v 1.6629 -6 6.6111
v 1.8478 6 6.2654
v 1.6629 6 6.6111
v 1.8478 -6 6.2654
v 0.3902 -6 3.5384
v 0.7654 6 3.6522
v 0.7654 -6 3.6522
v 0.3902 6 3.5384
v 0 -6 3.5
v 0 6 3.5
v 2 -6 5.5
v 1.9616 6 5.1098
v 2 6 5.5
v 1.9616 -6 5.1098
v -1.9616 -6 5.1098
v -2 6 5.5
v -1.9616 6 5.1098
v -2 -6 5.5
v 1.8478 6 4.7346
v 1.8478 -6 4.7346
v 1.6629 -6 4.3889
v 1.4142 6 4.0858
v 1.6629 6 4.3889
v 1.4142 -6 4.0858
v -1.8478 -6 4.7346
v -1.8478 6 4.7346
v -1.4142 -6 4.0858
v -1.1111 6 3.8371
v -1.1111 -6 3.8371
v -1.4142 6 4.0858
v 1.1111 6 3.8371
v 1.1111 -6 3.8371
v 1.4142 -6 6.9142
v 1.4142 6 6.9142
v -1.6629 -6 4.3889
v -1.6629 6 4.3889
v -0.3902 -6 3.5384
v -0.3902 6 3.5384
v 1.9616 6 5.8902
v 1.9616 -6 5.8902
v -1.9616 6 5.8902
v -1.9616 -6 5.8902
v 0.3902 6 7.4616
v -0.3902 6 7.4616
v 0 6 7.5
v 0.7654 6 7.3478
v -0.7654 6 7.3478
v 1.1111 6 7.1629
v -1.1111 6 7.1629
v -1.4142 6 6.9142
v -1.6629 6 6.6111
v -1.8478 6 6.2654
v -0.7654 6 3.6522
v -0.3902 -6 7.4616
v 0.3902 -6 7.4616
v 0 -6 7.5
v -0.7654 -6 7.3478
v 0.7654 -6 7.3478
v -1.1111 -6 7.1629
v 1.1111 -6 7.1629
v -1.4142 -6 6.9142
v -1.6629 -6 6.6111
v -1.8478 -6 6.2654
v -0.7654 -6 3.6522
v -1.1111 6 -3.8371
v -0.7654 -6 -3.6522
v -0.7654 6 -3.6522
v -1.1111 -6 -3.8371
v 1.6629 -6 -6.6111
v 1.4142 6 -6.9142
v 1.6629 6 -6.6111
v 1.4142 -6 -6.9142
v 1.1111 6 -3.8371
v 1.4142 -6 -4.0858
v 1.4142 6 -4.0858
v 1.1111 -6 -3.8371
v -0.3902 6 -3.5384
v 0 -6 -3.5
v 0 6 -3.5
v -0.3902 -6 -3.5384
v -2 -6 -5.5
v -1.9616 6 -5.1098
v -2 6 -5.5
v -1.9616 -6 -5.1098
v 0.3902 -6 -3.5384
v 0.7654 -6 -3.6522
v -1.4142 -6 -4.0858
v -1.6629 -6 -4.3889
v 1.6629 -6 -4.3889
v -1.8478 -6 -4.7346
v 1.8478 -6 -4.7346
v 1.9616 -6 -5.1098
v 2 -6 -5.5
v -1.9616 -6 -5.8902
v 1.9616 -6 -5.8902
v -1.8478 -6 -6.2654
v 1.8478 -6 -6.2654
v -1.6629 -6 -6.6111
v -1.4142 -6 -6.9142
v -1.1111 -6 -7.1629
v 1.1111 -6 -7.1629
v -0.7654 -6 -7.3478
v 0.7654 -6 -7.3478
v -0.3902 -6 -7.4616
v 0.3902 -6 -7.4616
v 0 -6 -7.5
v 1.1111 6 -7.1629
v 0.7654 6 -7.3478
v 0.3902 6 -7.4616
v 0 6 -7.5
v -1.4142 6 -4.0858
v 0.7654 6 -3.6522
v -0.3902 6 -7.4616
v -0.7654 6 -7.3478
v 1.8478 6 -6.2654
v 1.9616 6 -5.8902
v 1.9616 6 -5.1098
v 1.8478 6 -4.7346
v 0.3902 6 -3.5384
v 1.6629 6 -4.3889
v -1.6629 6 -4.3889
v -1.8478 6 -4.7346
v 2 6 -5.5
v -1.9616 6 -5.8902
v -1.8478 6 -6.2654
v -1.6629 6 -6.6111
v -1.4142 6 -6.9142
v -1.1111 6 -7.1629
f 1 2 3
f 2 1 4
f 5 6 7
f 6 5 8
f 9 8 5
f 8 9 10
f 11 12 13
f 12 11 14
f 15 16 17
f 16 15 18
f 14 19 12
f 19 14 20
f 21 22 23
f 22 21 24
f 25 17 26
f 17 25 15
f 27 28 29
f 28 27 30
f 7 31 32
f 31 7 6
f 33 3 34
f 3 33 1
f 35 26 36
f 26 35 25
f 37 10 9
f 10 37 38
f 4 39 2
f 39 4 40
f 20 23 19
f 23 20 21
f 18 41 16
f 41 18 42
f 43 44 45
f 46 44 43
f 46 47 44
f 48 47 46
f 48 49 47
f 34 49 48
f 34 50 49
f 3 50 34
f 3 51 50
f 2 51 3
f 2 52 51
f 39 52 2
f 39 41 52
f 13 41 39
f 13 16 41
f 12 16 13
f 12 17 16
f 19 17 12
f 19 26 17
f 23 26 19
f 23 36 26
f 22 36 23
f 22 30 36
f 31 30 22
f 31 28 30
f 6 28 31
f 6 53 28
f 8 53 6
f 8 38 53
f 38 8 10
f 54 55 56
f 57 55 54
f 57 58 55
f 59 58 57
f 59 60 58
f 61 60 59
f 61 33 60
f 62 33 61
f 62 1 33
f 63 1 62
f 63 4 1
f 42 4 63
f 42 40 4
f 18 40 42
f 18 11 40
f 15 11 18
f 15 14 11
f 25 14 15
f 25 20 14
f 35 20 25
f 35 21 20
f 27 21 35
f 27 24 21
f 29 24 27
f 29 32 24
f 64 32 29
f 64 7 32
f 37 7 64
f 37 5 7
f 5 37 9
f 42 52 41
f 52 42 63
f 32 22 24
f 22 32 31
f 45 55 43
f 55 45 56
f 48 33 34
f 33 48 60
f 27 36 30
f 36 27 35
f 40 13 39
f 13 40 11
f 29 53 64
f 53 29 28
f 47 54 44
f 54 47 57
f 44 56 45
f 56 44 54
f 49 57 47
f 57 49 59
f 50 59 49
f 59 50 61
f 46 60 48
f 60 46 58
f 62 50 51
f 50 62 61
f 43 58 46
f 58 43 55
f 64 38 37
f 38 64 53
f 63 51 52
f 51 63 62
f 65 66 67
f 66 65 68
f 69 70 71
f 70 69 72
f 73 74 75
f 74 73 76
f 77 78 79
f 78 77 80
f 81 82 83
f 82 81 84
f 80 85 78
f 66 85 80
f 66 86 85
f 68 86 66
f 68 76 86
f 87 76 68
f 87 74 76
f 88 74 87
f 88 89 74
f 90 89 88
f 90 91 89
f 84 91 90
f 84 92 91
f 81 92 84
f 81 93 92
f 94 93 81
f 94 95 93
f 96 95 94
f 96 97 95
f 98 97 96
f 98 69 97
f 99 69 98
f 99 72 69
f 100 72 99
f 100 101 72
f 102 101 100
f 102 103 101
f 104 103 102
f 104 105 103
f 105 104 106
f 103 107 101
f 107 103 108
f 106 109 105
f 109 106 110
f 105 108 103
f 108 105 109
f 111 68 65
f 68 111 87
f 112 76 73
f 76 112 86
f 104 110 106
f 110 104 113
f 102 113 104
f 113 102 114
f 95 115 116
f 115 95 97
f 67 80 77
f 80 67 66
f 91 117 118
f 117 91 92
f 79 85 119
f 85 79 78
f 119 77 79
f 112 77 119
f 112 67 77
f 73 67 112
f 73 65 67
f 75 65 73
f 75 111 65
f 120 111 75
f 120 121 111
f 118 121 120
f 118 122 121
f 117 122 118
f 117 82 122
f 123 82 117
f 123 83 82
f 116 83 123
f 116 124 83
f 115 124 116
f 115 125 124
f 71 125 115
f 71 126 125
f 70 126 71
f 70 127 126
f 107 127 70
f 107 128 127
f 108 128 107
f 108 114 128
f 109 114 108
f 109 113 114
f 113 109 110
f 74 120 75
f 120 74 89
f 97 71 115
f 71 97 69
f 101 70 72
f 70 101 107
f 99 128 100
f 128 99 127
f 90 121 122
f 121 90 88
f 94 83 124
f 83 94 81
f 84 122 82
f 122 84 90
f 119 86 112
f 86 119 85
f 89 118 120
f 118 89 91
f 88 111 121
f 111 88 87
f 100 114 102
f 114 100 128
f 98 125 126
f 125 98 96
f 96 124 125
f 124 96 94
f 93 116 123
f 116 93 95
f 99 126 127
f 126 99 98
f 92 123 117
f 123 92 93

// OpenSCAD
$fa = 1;
$fs = 0.4;

fudge = 0.01;
wall = 3;


frame_screw_distance = 11;
frame_screw_hole_d = 4;
frame_width = frame_screw_hole_d + wall;
frame_height = 17;

switch_screw_distance = 16; // 11
switch_screw_hull = true;
switch_screw_hole_d = 4;
switch_width = switch_screw_distance + switch_screw_hole_d + wall;
switch_height = frame_height + switch_screw_hole_d + wall;
switch_offset = 18;
switch_padding = 0;

union() {
    switch();
    frame();
}


module frame() {
    
    translate([(frame_width/2) + wall - fudge, wall/-2, frame_height/2])
    
    difference() {    
        // backing
        cube([frame_width, wall, frame_height], center=true);
        // screw holes
        translate([0, 0, (frame_height/2) - (frame_screw_hole_d/2) - (wall/2)])
        !rotate([0, 90, 0])
        for (s = [-2:4:2]) {
            translate([frame_screw_distance/s, 0, 0])
            rotate([90, 0, 0])
            cylinder(wall*4, d=frame_screw_hole_d, center=true);
        }
    }
}

module switch_screws() {
    translate([0, 0, (switch_height/2) - (switch_screw_hole_d/2) - (wall/2)])
    for (s = [-2:4:2]) {
        translate([switch_screw_distance/s, 0, 0])
        rotate([90, 0, 0])
        cylinder(wall*4, d=switch_screw_hole_d, center=true);
    }
}

module switch() {
    translate([0, 0, switch_height/2])
    union() {
        translate([wall/2, (switch_width/-2) - switch_padding + fudge, 0])
        rotate([0, 0, 90])
        difference() {
            // backing
            cube([switch_width, wall, switch_height], center=true);

            // screw holes
            if (switch_screw_hull) {
                hull()
                switch_screws();
            } else {
                switch_screws();
            }
        }

        // padding
        translate([wall/2, switch_padding/-2, 0])
            cube([wall, switch_padding, switch_height], center=true);
    }
}
